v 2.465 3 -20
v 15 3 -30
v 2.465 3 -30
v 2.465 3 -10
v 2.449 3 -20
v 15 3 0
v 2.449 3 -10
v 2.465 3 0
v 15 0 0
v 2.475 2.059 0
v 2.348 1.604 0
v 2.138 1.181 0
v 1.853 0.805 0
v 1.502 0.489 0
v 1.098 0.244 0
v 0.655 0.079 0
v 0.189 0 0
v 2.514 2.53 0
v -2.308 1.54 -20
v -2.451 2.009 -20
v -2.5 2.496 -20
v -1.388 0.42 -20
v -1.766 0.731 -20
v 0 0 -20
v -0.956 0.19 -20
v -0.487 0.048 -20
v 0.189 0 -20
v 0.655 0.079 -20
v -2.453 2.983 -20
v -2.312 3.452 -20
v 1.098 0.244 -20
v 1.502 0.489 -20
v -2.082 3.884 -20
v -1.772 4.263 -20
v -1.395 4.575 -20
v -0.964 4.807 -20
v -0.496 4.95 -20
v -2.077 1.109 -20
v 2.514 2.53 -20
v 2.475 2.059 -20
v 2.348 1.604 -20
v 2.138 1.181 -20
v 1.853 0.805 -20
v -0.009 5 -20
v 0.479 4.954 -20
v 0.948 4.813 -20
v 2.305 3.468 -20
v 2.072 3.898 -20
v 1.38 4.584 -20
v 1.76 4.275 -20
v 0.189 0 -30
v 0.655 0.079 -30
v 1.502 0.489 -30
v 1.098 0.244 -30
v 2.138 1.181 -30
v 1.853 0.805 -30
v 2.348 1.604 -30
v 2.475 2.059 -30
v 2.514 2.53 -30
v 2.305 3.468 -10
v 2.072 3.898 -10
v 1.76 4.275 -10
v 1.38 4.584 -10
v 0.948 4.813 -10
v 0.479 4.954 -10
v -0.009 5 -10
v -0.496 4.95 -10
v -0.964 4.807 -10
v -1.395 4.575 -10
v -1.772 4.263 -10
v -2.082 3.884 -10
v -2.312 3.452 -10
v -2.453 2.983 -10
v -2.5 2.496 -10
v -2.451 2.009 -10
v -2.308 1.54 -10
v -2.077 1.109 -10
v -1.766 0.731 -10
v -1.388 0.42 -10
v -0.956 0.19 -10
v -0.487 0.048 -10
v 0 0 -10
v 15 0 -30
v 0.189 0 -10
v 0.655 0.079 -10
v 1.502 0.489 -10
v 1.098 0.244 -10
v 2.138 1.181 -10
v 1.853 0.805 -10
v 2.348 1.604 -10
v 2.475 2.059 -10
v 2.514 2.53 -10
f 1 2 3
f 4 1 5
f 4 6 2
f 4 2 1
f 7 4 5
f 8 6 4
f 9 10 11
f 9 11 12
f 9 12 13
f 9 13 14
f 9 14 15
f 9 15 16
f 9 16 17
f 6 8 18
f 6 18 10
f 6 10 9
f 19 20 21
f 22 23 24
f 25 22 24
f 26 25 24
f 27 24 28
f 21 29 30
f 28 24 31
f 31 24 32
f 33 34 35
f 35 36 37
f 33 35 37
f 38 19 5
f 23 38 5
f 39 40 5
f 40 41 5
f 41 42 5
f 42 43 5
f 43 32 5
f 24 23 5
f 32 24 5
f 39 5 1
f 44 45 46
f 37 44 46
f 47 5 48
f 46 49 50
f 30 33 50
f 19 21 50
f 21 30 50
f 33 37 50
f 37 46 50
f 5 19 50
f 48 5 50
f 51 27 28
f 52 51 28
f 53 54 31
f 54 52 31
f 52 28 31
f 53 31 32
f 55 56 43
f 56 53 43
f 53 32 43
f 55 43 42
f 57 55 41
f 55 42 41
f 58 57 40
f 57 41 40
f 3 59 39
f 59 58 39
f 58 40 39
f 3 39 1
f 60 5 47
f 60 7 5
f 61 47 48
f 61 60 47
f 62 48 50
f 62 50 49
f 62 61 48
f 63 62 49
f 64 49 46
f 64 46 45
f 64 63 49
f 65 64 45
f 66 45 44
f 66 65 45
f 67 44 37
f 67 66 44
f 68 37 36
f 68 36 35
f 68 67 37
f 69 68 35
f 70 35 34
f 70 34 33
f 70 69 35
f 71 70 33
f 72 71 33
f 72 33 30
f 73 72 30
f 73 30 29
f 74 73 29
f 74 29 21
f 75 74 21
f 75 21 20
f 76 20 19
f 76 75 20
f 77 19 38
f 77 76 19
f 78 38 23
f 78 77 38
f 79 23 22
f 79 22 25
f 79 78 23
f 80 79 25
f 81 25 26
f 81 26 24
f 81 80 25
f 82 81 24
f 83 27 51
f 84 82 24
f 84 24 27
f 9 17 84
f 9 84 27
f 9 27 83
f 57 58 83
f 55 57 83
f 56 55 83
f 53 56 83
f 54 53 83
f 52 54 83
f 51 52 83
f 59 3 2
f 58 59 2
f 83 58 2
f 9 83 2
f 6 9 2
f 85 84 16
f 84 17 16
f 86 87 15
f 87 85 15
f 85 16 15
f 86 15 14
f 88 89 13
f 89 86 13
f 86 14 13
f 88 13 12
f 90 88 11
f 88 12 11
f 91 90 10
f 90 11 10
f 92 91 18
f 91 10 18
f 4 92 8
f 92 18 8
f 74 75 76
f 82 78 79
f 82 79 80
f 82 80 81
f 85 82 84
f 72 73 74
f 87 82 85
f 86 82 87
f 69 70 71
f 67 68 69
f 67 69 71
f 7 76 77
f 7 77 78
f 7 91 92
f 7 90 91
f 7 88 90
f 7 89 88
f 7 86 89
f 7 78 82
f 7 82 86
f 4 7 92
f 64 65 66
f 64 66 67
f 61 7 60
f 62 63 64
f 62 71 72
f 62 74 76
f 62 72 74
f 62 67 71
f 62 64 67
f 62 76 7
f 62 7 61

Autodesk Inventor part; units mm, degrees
ref_plane "YZ Plane" through (0, 0, 0) normal (1, 0, 0) x (0, 1, 0)
ref_plane "XZ Plane" through (0, 0, 0) normal (0, 1, 0) x (-1, 0, 0)
ref_plane "XY Plane" through (0, 0, 0) normal (0, 0, 1) x (1, 0, 0)
sketch "Sketch1" plane through (0, 0, 0) normal (0, 0, 1) x (1, 0, 0)
  line L0 (0, 0) -> (15, 0)
  line L1 (15, 0) -> (15, 3)
  line L2 (15, 3) -> (0, 3)
  line L3 (0, 3) -> (0, 0)
  circle A0 centre (0, 2.5) radius 2.5
  point P0 (0, 1.5)
  point P1 (2.4495, 3)
  dimension "d0" = 15
  dimension "d1" = 3
  dimension "d2" = 5
extrude "Extrusion1" add sketch "Sketch1" against normal blind 30
sketch "Sketch2" plane through (0, 0, 0) normal (0, 0, 1) x (1, 0, 0)
  arc A0 (2.4495, 3) -> (0, 0) centre (0, 2.5) ccw projected
  circle A1 centre (0.0044, 2.5032) radius 2.51
  dimension "d5" = 5.02
extrude "Extrusion2" cut sketch "Sketch2" against normal blind 10
pattern_linear "Rectangular Pattern1" count 2 spacing 20 along (0, 0, -1) of "Extrusion2"
properties part number "Clip1" material "Stainless Steel"
